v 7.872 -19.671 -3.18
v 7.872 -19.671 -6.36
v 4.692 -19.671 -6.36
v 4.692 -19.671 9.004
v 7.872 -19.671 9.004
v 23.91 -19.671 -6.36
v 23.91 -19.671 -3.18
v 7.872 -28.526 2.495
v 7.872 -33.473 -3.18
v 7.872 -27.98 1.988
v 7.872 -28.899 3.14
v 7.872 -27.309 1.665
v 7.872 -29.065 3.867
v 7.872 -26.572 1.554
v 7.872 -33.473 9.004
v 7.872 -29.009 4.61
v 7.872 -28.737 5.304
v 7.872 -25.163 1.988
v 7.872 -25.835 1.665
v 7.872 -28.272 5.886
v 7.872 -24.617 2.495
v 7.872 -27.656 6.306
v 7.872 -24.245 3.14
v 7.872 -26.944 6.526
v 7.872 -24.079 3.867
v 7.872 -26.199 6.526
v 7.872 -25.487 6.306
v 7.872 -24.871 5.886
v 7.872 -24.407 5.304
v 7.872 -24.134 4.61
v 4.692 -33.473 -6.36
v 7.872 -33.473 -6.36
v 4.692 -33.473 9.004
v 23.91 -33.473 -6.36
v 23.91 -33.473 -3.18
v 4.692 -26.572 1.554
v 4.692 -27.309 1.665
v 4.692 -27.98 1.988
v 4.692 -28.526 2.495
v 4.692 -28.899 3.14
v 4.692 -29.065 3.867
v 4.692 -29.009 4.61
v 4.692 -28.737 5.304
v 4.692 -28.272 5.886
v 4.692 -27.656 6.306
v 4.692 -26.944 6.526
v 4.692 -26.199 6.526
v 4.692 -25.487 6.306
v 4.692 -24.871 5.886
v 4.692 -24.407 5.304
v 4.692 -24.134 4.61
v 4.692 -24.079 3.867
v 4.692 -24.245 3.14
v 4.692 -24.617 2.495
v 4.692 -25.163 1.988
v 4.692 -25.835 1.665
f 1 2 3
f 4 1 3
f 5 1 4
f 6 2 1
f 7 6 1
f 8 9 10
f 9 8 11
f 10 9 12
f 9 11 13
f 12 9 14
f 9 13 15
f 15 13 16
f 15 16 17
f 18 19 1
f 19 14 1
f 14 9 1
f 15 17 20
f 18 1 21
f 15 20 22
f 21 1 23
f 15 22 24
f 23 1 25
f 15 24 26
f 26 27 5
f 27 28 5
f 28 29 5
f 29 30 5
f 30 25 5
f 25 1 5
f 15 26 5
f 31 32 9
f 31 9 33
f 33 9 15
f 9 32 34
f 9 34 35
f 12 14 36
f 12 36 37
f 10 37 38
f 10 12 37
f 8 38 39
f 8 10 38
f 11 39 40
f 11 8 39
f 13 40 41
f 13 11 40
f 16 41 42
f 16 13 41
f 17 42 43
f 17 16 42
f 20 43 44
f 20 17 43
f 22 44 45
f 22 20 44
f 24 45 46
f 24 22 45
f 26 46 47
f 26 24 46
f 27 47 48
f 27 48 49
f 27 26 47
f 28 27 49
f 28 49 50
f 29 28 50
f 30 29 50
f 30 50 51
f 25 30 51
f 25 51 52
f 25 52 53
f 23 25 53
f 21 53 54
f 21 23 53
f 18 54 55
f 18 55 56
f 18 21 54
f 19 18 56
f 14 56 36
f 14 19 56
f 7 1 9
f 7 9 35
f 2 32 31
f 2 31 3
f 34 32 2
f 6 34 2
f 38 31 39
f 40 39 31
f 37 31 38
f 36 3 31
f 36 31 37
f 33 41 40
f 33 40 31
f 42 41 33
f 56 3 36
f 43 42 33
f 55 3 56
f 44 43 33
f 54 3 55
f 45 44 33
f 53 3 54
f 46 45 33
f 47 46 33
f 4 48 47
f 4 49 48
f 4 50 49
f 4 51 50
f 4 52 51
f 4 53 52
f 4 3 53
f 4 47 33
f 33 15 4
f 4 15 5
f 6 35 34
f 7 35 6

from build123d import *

# Parameters (mm, degrees)
BOSS_EXTRUDE1_START = -3.18
SKETCH1_W           = 16.037750947
SKETCH1_H           = 13.801978015
BOSS_EXTRUDE1_DEPTH = 3.18
SKETCH3_W           = 15.364094043
SKETCH3_H           = 13.801978015
SKETCH3_R           = 2.5
BOSS_EXTRUDE2_DEPTH = 3.18


with BuildPart() as part:
    # Sketch1 → Boss-Extrude1 (new body)
    with BuildSketch(Plane.XY.offset(BOSS_EXTRUDE1_START)):
        with Locations((15.890651203, -26.571727946)):
            Rectangle(SKETCH1_W, SKETCH1_H)
    extrude(amount=-BOSS_EXTRUDE1_DEPTH)

    # Sketch3 → Boss-Extrude2 (add)
    with BuildSketch(Plane.ZY.offset(-7.871775729)):
        with Locations((1.322047021, -26.571727946)):
            Rectangle(SKETCH3_W, SKETCH3_H)
        with Locations(Location((4.053672899, -26.571727946, 0), (0, 0, 180))):
            Circle(SKETCH3_R, mode=Mode.SUBTRACT)
    extrude(amount=BOSS_EXTRUDE2_DEPTH)


solid = part.part
